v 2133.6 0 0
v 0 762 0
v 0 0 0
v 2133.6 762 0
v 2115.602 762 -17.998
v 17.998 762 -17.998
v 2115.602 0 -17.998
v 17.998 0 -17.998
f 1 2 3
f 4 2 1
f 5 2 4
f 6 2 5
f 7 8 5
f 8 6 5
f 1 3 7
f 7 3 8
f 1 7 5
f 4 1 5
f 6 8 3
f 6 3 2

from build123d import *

# Parameters (mm, degrees)
F0_W     = 2133.6
F0_H     = 762
F1_DEPTH = 17.99844
F2_SIZE  = 17.99843


# Not quite as in the source:
# - a fillet or chamfer is up to 0.001 mm smaller than in the source, because OpenCascade refuses the exact size


with BuildPart() as f1:
    # F0 (on Top) → F1 (new body)
    with BuildSketch(Plane.XY):
        with Locations((1066.8, 381)):
            Rectangle(F0_W, F0_H)
    extrude(amount=-F1_DEPTH)

    # F2 (size 17.99844 in the source; OpenCascade refuses exactly that, so slightly less here)
    f2_edges = [f1.edges().sort_by_distance(p)[0] for p in [
        (2133.6, 381, -17.99844),
        (0, 381, -17.99844),
    ]]
    chamfer(f2_edges, length=F2_SIZE)


solid = f1.part
